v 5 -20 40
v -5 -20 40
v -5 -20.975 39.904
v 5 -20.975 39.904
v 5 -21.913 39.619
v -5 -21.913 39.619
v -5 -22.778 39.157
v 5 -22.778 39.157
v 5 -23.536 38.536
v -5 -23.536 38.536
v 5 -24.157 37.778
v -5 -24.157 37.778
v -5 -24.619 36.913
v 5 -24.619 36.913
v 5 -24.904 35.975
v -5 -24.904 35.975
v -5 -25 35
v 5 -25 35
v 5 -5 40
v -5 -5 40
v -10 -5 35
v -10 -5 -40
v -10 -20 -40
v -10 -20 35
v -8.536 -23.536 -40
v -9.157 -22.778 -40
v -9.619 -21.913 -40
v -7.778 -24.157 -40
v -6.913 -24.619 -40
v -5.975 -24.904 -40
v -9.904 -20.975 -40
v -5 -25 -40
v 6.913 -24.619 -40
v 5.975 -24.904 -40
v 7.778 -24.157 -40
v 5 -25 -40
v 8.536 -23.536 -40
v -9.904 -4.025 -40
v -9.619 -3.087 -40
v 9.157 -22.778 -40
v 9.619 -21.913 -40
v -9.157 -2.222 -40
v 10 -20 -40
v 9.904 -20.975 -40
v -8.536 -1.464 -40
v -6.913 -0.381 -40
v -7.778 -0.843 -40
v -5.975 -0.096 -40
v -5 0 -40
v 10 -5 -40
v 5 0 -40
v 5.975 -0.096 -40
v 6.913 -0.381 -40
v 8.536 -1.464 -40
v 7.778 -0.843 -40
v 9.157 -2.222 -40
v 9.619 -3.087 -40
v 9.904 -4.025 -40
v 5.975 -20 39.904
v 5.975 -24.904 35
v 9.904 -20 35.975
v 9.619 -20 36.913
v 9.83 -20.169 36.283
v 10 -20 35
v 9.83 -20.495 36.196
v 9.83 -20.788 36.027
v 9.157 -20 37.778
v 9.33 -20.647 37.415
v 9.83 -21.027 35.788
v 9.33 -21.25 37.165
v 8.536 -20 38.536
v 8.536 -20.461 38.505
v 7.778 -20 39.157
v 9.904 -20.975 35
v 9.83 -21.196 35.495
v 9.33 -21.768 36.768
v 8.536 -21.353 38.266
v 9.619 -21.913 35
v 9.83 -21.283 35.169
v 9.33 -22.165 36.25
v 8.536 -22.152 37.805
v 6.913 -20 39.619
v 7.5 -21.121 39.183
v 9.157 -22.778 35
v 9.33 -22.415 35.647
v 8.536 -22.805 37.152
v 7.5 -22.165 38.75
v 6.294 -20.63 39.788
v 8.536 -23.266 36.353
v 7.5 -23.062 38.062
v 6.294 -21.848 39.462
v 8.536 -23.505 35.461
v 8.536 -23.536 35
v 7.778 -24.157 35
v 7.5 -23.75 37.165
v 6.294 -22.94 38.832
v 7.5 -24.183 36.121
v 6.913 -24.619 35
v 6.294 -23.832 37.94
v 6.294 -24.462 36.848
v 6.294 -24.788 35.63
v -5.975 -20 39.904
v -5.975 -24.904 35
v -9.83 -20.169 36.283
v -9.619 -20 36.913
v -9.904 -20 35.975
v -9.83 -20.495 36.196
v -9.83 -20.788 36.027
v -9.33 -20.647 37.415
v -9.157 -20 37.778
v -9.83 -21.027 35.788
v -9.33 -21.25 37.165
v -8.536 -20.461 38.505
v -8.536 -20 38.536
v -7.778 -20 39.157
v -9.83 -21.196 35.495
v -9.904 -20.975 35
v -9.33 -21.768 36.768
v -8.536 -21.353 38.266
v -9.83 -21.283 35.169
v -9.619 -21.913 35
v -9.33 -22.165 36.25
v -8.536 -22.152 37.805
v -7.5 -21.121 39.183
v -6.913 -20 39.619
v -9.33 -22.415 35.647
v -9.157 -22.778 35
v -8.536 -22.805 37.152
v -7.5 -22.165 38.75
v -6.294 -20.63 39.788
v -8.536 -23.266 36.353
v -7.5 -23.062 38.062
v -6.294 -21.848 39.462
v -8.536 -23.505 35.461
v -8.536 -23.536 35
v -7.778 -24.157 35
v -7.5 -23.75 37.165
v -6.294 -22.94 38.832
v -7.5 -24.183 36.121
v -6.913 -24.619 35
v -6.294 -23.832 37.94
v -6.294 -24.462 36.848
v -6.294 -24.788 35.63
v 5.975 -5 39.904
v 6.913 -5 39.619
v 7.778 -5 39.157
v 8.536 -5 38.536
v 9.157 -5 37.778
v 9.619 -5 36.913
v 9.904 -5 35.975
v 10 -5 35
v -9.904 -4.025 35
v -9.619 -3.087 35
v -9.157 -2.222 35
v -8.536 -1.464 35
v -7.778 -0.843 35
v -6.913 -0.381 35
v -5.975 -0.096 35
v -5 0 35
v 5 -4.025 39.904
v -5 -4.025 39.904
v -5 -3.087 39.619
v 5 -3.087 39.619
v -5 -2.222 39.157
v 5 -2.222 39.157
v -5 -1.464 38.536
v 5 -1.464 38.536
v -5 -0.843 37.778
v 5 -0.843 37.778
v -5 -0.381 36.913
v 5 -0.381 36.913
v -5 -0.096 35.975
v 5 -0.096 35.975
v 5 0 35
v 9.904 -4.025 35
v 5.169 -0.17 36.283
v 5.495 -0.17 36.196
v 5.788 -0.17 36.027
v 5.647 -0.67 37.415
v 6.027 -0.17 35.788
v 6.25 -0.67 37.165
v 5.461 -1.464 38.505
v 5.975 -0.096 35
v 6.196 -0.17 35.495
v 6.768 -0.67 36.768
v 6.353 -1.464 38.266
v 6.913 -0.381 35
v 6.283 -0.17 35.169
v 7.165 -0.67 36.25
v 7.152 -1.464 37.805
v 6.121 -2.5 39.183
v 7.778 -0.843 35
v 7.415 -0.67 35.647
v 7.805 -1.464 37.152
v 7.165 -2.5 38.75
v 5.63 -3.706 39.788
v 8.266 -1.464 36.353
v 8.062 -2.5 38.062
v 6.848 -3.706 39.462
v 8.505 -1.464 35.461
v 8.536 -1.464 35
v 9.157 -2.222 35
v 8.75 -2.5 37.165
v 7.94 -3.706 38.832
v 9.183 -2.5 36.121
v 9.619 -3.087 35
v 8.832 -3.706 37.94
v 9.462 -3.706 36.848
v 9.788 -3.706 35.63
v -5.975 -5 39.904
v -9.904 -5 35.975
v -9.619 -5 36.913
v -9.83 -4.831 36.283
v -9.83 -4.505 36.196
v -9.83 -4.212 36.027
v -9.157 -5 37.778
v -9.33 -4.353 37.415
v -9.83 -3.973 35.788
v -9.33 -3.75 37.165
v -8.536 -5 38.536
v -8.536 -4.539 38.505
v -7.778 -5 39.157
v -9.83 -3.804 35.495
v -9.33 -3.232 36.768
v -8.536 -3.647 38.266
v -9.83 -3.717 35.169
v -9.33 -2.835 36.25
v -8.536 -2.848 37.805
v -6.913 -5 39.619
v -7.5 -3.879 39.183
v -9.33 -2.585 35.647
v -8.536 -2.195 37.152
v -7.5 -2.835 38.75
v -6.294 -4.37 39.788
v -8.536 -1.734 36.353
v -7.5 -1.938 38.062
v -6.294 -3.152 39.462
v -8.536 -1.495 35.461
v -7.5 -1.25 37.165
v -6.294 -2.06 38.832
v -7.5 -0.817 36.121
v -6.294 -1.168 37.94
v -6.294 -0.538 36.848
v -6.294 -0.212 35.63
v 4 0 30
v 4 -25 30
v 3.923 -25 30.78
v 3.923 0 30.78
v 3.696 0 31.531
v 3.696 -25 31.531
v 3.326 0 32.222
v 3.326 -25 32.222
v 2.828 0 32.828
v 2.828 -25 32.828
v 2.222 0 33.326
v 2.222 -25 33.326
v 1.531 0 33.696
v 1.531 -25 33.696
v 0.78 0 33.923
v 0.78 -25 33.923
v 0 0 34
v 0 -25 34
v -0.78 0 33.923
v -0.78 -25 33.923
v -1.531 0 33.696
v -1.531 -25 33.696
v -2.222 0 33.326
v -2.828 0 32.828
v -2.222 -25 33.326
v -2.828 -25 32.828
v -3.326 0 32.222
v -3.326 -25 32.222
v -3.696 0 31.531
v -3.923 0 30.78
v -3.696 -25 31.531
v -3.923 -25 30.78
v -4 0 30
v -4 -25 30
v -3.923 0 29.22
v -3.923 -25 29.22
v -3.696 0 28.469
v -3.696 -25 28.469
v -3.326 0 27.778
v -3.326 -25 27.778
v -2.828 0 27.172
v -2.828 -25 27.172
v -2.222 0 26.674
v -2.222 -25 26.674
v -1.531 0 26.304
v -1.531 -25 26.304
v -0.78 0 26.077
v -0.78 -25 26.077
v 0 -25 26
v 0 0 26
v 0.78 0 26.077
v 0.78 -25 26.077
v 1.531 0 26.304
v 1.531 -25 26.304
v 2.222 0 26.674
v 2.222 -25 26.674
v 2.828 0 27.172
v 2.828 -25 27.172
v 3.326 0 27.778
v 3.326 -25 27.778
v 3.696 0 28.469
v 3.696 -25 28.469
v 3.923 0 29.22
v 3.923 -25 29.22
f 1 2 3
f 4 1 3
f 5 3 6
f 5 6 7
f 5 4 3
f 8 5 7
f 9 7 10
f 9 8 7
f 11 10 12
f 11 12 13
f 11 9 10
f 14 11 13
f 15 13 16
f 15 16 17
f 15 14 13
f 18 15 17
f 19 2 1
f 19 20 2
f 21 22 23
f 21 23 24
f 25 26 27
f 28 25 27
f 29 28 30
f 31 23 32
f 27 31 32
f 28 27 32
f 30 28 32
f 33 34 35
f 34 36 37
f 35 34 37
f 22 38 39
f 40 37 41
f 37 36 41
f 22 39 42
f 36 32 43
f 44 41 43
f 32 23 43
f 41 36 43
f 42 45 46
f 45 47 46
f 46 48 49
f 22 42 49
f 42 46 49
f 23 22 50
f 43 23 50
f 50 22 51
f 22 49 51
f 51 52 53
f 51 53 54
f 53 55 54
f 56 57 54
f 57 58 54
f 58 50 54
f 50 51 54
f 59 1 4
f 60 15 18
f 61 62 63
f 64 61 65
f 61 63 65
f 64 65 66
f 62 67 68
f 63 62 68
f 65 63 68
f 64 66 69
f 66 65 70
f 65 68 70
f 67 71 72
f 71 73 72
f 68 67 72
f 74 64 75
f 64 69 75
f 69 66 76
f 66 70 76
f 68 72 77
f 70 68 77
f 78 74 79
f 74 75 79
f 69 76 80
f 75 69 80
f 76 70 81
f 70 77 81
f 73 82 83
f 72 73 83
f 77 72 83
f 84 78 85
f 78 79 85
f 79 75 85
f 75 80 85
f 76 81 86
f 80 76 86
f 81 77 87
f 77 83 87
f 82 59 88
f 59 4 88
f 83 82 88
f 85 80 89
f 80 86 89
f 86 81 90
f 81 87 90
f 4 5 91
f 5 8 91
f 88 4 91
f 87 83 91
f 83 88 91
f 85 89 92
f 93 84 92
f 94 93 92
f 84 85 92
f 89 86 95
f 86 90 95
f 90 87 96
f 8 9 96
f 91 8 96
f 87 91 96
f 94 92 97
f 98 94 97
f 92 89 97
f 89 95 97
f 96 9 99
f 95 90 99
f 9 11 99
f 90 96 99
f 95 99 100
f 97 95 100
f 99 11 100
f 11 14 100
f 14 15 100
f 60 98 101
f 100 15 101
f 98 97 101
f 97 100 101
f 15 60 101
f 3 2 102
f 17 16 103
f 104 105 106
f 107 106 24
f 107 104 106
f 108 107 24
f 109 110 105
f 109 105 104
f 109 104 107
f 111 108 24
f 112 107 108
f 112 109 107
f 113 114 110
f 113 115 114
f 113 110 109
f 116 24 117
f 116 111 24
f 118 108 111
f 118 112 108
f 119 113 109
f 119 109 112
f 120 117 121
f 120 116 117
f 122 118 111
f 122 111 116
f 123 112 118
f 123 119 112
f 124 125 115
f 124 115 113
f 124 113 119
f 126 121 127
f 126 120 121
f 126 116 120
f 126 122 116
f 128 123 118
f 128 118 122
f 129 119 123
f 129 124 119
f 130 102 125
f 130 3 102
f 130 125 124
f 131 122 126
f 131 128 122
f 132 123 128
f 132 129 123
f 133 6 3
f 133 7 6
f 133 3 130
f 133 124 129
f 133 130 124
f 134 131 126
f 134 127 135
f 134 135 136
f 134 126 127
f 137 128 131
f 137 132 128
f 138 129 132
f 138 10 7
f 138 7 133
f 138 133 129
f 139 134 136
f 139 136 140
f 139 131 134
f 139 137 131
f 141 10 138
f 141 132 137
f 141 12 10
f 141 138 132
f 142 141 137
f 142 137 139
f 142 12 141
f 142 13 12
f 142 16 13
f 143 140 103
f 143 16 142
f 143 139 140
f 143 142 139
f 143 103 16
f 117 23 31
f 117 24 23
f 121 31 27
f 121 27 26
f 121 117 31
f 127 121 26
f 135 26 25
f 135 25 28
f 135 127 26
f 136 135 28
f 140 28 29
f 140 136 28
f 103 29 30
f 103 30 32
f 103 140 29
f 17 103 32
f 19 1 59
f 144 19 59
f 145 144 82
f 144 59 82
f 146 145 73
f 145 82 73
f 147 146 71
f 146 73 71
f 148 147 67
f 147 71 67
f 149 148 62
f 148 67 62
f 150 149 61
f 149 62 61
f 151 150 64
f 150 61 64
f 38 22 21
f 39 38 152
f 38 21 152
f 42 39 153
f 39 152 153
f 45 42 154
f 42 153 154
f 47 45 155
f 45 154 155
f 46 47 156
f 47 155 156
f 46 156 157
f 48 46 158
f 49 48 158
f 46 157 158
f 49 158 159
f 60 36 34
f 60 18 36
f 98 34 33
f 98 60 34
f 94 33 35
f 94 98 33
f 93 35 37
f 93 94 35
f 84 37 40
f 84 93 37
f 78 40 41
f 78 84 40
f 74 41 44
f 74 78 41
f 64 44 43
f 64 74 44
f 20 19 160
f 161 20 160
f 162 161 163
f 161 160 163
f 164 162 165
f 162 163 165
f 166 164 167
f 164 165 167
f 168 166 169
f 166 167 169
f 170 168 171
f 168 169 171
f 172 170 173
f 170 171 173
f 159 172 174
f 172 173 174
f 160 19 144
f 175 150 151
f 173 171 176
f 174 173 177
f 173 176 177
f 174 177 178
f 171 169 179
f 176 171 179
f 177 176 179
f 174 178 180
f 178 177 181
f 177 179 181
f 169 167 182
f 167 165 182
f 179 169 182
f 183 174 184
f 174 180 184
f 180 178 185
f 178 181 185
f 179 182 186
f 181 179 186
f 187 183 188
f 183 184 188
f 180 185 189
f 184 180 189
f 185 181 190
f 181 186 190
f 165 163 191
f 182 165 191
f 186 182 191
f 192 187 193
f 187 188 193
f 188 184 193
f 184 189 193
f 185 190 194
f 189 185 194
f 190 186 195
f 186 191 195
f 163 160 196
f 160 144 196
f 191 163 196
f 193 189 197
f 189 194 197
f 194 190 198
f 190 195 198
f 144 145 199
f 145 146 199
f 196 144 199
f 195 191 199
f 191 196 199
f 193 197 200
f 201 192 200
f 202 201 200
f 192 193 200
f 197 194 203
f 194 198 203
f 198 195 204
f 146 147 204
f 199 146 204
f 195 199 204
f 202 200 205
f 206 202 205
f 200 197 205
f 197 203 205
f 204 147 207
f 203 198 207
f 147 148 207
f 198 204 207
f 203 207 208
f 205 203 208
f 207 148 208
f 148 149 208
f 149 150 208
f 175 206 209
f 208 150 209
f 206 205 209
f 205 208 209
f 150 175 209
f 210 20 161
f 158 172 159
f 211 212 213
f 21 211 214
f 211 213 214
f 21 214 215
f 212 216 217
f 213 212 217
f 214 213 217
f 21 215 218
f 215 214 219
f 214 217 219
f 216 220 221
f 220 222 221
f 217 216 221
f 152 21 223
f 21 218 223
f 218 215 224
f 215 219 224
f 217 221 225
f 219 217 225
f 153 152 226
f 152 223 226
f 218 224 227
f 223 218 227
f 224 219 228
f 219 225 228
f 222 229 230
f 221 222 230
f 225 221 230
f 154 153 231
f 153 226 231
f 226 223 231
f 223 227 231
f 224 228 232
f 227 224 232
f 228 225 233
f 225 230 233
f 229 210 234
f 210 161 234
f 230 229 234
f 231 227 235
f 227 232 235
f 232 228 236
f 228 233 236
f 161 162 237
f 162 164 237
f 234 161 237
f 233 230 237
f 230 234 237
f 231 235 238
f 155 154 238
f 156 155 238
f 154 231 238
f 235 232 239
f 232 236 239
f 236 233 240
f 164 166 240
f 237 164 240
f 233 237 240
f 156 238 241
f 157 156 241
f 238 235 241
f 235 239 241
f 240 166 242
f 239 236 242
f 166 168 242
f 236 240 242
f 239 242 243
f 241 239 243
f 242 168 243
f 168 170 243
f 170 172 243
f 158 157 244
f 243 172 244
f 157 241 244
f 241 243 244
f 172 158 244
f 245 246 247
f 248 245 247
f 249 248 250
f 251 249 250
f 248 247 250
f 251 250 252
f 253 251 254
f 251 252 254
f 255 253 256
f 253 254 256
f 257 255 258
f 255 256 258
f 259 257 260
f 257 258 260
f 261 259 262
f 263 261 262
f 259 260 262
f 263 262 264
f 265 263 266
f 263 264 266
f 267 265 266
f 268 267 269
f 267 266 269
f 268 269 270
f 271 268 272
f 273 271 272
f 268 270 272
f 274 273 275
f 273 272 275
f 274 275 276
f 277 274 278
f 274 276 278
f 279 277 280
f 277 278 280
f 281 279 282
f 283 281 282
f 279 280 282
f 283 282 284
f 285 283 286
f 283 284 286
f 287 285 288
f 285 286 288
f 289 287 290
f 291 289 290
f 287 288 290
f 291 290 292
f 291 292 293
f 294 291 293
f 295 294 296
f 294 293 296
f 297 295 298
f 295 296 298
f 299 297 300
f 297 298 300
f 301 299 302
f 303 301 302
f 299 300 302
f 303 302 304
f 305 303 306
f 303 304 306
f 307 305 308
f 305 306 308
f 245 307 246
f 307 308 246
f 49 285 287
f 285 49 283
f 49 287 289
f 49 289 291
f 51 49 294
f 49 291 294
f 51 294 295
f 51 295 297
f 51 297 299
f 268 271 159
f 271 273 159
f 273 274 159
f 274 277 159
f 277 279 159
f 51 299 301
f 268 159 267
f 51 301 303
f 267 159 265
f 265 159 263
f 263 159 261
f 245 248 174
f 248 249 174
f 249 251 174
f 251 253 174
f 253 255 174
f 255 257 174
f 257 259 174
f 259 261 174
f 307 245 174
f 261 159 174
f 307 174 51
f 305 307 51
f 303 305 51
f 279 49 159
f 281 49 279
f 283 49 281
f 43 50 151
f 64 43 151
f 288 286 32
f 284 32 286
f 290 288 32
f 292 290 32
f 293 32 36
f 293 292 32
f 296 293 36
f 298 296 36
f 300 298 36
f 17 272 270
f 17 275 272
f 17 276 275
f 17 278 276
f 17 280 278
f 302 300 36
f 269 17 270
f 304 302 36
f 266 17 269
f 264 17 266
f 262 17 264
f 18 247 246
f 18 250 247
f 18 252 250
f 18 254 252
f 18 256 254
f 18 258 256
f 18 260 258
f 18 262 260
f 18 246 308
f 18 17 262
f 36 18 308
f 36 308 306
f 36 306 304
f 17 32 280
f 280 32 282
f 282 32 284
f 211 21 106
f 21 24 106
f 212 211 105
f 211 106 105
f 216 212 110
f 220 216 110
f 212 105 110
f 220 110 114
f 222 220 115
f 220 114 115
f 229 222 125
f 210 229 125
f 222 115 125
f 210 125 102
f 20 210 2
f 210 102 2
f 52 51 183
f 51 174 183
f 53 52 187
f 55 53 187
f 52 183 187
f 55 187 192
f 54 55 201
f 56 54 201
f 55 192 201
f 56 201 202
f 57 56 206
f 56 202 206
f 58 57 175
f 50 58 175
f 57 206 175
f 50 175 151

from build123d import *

# Parameters (mm, degrees)
F0_W     = 20
F0_H     = 80
F1_DEPTH = 25
F2_R     = 4
F3_DEPTH = 25
F4_R     = 5


with BuildPart() as f1:
    # F0 (on Front) → F1 (new body)
    with BuildSketch(Plane.XZ):
        Rectangle(F0_W, F0_H)
    extrude(amount=F1_DEPTH)

    # F2 (on face) → F3 (cut)
    with BuildSketch(Plane.XZ.offset(25)):
        with Locations((0, 30)):
            Circle(F2_R)
    extrude(amount=-F3_DEPTH, mode=Mode.SUBTRACT)

    # F4
    f4_edges = [f1.edges().sort_by_distance(p)[0] for p in [
        (0, -25, 40),
        (10, -12.5, 40),
        (0, 0, 40),
        (-10, -12.5, 40),
        (10, -25, 0),
        (-10, 0, 0),
        (10, 0, 0),
        (-10, -25, 0),
    ]]
    fillet(f4_edges, radius=F4_R)


solid = f1.part
